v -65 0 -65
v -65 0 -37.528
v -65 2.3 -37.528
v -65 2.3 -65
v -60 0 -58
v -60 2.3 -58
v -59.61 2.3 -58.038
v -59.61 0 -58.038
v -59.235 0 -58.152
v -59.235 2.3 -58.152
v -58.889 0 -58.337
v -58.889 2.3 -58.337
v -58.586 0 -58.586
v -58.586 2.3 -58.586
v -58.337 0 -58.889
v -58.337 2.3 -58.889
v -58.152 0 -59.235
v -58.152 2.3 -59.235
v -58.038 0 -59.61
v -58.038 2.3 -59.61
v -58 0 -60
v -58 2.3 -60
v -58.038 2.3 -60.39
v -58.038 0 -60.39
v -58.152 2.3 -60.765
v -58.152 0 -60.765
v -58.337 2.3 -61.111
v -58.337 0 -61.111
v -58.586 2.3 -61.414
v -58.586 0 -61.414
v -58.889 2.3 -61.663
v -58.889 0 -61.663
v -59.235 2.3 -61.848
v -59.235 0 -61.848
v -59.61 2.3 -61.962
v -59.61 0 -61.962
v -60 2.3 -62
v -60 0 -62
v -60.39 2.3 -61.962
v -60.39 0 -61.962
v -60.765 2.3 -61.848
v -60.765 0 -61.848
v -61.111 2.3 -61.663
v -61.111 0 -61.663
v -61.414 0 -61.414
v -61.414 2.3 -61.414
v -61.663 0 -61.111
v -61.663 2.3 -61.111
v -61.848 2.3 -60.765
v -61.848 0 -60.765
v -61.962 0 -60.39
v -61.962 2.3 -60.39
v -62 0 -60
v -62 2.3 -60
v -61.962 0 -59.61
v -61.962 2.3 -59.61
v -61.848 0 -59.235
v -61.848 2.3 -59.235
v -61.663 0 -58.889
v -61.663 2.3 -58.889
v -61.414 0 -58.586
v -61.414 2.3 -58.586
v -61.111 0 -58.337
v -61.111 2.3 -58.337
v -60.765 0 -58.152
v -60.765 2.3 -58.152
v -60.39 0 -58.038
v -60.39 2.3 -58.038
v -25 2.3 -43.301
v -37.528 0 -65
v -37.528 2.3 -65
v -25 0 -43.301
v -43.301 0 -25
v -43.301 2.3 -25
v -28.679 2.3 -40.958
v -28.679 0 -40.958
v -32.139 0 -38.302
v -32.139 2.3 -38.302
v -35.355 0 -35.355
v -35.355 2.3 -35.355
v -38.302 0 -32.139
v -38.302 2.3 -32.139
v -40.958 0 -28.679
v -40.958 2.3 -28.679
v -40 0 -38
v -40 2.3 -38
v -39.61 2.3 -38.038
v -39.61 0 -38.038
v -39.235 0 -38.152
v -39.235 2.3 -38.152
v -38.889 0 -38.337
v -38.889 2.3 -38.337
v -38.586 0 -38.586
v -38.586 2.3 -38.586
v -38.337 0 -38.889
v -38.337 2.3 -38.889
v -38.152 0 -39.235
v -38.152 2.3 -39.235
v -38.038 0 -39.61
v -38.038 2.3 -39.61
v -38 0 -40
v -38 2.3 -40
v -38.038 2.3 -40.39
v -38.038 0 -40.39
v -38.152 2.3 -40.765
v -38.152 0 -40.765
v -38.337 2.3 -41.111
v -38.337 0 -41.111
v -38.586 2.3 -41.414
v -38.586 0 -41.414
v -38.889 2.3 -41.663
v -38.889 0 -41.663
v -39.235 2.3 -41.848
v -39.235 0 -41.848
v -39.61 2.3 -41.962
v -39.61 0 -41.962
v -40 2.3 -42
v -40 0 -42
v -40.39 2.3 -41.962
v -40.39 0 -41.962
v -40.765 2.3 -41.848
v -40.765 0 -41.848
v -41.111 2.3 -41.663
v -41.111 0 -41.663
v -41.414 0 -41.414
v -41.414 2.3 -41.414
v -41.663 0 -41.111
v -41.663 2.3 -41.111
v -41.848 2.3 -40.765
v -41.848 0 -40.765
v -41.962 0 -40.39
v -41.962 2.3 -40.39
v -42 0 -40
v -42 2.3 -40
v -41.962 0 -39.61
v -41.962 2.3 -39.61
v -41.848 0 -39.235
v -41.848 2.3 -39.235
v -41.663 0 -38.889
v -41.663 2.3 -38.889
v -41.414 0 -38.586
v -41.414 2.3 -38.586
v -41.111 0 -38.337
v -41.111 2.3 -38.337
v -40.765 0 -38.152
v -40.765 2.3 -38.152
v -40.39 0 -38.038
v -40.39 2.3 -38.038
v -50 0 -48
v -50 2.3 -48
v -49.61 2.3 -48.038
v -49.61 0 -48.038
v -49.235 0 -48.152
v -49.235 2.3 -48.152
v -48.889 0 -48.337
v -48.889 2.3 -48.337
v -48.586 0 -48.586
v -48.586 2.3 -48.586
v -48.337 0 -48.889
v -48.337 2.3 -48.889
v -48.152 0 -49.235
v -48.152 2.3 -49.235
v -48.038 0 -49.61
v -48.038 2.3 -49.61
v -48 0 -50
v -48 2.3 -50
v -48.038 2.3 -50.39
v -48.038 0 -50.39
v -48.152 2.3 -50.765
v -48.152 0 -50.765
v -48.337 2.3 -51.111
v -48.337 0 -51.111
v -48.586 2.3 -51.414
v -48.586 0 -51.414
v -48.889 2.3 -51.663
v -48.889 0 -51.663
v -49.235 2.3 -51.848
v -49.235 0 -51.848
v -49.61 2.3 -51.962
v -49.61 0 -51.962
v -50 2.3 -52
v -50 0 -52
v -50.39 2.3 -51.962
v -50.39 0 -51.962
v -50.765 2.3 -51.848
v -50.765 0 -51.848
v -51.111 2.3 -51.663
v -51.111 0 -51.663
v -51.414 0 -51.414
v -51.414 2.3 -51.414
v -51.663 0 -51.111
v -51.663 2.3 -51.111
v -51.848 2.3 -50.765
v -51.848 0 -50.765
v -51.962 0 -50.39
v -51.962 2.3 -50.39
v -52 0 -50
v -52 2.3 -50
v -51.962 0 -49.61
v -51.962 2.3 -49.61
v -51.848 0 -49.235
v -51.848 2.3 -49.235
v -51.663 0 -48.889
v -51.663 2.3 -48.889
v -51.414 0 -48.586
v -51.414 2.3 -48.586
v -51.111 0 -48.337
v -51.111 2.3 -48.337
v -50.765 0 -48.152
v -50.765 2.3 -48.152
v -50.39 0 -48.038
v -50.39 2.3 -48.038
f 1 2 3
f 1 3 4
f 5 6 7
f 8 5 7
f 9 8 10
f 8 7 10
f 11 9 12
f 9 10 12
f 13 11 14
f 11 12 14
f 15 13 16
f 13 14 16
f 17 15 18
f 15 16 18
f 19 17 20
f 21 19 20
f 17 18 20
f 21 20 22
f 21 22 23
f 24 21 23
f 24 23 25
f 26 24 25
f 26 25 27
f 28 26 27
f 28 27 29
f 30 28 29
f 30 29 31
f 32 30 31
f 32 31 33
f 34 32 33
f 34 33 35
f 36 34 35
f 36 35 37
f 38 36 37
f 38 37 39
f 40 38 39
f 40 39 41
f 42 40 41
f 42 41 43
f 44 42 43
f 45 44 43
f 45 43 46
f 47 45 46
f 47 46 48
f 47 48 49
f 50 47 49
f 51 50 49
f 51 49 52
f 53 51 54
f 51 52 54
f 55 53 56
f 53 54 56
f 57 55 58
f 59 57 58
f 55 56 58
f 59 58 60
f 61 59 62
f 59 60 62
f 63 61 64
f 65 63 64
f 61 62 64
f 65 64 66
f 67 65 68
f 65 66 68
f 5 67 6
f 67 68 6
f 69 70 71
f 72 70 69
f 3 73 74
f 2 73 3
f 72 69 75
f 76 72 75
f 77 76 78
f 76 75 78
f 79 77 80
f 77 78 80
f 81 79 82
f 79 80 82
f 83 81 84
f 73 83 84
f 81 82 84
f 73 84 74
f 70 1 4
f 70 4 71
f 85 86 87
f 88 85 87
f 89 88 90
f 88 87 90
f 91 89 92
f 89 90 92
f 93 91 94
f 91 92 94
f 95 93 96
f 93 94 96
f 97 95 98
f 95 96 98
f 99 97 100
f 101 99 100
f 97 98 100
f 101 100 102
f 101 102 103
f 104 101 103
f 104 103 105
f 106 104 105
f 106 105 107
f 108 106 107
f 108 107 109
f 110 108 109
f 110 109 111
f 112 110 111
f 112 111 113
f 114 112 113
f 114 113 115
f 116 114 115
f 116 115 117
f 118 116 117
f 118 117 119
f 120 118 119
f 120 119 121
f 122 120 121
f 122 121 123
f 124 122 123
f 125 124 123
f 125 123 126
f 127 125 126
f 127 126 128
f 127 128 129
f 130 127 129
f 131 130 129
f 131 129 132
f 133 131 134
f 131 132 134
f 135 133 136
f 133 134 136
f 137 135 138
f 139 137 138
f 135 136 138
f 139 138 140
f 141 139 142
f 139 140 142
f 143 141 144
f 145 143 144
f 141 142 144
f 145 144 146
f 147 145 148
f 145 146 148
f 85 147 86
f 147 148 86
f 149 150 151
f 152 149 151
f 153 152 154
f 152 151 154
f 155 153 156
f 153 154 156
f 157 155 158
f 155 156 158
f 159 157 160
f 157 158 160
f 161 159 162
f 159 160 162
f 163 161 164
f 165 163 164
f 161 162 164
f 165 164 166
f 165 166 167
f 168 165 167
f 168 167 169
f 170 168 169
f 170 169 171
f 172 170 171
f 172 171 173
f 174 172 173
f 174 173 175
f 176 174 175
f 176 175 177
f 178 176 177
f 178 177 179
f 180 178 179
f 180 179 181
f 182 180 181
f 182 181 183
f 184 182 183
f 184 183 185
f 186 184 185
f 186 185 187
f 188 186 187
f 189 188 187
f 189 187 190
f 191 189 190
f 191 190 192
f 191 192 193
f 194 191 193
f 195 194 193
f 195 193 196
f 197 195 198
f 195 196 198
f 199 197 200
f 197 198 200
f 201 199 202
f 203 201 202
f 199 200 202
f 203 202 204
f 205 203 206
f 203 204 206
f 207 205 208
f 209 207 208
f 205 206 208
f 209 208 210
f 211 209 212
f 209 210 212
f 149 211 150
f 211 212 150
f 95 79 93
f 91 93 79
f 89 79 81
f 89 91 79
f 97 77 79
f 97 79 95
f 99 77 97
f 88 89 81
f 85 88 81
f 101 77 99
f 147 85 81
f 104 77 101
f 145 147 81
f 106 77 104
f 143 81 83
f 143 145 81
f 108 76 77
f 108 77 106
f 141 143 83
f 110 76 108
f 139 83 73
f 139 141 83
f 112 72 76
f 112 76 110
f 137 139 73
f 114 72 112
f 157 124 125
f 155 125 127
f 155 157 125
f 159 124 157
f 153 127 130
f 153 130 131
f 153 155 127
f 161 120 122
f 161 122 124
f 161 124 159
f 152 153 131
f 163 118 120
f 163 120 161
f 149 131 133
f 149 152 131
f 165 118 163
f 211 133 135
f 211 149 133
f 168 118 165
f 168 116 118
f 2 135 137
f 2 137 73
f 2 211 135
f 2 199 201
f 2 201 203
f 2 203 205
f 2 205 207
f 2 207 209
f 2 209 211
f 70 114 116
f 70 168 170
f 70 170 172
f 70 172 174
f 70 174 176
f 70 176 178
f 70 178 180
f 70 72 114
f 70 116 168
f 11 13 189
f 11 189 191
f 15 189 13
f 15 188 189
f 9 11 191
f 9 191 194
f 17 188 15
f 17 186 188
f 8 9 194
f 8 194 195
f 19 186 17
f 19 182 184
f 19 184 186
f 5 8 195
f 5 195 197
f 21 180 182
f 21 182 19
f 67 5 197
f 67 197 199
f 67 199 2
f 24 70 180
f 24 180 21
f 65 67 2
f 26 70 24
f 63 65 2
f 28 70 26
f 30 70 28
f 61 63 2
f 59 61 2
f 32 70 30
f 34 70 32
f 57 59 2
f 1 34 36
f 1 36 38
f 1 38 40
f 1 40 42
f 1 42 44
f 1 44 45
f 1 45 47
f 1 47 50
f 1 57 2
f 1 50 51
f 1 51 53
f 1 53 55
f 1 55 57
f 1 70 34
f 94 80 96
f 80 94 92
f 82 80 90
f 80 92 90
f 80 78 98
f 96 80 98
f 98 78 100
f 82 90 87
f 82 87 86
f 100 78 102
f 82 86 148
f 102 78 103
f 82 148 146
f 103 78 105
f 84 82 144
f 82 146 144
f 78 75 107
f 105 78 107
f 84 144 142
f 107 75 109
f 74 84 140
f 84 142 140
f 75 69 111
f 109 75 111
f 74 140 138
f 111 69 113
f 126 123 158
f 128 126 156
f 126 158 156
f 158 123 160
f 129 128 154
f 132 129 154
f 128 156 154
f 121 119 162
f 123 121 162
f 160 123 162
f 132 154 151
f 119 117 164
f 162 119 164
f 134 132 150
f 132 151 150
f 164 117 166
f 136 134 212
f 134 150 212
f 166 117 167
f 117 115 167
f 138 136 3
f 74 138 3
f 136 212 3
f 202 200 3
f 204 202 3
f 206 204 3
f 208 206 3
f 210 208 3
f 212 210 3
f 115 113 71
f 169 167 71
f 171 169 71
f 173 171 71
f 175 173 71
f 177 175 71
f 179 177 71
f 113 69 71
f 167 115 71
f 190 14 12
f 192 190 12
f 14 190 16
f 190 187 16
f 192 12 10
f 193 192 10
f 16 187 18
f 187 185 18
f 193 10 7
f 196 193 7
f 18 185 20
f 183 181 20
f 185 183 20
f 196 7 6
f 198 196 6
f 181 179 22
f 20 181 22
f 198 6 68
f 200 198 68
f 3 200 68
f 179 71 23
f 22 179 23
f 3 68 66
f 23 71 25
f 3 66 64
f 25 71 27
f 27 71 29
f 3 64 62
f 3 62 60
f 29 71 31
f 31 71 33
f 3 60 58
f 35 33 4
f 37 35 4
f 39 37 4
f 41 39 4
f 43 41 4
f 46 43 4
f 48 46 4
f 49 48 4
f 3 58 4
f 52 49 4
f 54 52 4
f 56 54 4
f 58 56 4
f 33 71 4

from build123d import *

# Parameters (mm, degrees)
BOSS_EXTRUDE1_DEPTH = 2.3
SKETCH4_R           = 2
SKETCH4_R_2         = 50
CUT_EXTRUDE1_DEPTH  = 92.952650859


with BuildPart() as part:
    # Sketch3 → Boss-Extrude1 (new body)
    with BuildSketch(Plane(origin=(0, 0, 0), x_dir=(1, 0, 0), z_dir=(0, 1, 0))):
        Polygon((-65, 65), (-37.527767497, 65), (-25, 43.301270189), (-43.301270189, 25), (-65, 37.527767497), align=None)
    extrude(amount=BOSS_EXTRUDE1_DEPTH)

    # Sketch4 → Cut-Extrude1 (cut, through all)
    with BuildSketch(Plane(origin=(0, 2.3, 0), x_dir=(1, 0, 0), z_dir=(0, 1, 0))):
        with Locations(Location((-60, 60, 0), (0, 0, 270))):
            Circle(SKETCH4_R)
        with Locations(Location((-50, 50, 0), (0, 0, 270))):
            Circle(SKETCH4_R)
        with Locations(Location((-40, 40, 0), (0, 0, 270))):
            Circle(SKETCH4_R)
        Circle(SKETCH4_R_2)
    extrude(amount=-CUT_EXTRUDE1_DEPTH, mode=Mode.SUBTRACT)


solid = part.part
